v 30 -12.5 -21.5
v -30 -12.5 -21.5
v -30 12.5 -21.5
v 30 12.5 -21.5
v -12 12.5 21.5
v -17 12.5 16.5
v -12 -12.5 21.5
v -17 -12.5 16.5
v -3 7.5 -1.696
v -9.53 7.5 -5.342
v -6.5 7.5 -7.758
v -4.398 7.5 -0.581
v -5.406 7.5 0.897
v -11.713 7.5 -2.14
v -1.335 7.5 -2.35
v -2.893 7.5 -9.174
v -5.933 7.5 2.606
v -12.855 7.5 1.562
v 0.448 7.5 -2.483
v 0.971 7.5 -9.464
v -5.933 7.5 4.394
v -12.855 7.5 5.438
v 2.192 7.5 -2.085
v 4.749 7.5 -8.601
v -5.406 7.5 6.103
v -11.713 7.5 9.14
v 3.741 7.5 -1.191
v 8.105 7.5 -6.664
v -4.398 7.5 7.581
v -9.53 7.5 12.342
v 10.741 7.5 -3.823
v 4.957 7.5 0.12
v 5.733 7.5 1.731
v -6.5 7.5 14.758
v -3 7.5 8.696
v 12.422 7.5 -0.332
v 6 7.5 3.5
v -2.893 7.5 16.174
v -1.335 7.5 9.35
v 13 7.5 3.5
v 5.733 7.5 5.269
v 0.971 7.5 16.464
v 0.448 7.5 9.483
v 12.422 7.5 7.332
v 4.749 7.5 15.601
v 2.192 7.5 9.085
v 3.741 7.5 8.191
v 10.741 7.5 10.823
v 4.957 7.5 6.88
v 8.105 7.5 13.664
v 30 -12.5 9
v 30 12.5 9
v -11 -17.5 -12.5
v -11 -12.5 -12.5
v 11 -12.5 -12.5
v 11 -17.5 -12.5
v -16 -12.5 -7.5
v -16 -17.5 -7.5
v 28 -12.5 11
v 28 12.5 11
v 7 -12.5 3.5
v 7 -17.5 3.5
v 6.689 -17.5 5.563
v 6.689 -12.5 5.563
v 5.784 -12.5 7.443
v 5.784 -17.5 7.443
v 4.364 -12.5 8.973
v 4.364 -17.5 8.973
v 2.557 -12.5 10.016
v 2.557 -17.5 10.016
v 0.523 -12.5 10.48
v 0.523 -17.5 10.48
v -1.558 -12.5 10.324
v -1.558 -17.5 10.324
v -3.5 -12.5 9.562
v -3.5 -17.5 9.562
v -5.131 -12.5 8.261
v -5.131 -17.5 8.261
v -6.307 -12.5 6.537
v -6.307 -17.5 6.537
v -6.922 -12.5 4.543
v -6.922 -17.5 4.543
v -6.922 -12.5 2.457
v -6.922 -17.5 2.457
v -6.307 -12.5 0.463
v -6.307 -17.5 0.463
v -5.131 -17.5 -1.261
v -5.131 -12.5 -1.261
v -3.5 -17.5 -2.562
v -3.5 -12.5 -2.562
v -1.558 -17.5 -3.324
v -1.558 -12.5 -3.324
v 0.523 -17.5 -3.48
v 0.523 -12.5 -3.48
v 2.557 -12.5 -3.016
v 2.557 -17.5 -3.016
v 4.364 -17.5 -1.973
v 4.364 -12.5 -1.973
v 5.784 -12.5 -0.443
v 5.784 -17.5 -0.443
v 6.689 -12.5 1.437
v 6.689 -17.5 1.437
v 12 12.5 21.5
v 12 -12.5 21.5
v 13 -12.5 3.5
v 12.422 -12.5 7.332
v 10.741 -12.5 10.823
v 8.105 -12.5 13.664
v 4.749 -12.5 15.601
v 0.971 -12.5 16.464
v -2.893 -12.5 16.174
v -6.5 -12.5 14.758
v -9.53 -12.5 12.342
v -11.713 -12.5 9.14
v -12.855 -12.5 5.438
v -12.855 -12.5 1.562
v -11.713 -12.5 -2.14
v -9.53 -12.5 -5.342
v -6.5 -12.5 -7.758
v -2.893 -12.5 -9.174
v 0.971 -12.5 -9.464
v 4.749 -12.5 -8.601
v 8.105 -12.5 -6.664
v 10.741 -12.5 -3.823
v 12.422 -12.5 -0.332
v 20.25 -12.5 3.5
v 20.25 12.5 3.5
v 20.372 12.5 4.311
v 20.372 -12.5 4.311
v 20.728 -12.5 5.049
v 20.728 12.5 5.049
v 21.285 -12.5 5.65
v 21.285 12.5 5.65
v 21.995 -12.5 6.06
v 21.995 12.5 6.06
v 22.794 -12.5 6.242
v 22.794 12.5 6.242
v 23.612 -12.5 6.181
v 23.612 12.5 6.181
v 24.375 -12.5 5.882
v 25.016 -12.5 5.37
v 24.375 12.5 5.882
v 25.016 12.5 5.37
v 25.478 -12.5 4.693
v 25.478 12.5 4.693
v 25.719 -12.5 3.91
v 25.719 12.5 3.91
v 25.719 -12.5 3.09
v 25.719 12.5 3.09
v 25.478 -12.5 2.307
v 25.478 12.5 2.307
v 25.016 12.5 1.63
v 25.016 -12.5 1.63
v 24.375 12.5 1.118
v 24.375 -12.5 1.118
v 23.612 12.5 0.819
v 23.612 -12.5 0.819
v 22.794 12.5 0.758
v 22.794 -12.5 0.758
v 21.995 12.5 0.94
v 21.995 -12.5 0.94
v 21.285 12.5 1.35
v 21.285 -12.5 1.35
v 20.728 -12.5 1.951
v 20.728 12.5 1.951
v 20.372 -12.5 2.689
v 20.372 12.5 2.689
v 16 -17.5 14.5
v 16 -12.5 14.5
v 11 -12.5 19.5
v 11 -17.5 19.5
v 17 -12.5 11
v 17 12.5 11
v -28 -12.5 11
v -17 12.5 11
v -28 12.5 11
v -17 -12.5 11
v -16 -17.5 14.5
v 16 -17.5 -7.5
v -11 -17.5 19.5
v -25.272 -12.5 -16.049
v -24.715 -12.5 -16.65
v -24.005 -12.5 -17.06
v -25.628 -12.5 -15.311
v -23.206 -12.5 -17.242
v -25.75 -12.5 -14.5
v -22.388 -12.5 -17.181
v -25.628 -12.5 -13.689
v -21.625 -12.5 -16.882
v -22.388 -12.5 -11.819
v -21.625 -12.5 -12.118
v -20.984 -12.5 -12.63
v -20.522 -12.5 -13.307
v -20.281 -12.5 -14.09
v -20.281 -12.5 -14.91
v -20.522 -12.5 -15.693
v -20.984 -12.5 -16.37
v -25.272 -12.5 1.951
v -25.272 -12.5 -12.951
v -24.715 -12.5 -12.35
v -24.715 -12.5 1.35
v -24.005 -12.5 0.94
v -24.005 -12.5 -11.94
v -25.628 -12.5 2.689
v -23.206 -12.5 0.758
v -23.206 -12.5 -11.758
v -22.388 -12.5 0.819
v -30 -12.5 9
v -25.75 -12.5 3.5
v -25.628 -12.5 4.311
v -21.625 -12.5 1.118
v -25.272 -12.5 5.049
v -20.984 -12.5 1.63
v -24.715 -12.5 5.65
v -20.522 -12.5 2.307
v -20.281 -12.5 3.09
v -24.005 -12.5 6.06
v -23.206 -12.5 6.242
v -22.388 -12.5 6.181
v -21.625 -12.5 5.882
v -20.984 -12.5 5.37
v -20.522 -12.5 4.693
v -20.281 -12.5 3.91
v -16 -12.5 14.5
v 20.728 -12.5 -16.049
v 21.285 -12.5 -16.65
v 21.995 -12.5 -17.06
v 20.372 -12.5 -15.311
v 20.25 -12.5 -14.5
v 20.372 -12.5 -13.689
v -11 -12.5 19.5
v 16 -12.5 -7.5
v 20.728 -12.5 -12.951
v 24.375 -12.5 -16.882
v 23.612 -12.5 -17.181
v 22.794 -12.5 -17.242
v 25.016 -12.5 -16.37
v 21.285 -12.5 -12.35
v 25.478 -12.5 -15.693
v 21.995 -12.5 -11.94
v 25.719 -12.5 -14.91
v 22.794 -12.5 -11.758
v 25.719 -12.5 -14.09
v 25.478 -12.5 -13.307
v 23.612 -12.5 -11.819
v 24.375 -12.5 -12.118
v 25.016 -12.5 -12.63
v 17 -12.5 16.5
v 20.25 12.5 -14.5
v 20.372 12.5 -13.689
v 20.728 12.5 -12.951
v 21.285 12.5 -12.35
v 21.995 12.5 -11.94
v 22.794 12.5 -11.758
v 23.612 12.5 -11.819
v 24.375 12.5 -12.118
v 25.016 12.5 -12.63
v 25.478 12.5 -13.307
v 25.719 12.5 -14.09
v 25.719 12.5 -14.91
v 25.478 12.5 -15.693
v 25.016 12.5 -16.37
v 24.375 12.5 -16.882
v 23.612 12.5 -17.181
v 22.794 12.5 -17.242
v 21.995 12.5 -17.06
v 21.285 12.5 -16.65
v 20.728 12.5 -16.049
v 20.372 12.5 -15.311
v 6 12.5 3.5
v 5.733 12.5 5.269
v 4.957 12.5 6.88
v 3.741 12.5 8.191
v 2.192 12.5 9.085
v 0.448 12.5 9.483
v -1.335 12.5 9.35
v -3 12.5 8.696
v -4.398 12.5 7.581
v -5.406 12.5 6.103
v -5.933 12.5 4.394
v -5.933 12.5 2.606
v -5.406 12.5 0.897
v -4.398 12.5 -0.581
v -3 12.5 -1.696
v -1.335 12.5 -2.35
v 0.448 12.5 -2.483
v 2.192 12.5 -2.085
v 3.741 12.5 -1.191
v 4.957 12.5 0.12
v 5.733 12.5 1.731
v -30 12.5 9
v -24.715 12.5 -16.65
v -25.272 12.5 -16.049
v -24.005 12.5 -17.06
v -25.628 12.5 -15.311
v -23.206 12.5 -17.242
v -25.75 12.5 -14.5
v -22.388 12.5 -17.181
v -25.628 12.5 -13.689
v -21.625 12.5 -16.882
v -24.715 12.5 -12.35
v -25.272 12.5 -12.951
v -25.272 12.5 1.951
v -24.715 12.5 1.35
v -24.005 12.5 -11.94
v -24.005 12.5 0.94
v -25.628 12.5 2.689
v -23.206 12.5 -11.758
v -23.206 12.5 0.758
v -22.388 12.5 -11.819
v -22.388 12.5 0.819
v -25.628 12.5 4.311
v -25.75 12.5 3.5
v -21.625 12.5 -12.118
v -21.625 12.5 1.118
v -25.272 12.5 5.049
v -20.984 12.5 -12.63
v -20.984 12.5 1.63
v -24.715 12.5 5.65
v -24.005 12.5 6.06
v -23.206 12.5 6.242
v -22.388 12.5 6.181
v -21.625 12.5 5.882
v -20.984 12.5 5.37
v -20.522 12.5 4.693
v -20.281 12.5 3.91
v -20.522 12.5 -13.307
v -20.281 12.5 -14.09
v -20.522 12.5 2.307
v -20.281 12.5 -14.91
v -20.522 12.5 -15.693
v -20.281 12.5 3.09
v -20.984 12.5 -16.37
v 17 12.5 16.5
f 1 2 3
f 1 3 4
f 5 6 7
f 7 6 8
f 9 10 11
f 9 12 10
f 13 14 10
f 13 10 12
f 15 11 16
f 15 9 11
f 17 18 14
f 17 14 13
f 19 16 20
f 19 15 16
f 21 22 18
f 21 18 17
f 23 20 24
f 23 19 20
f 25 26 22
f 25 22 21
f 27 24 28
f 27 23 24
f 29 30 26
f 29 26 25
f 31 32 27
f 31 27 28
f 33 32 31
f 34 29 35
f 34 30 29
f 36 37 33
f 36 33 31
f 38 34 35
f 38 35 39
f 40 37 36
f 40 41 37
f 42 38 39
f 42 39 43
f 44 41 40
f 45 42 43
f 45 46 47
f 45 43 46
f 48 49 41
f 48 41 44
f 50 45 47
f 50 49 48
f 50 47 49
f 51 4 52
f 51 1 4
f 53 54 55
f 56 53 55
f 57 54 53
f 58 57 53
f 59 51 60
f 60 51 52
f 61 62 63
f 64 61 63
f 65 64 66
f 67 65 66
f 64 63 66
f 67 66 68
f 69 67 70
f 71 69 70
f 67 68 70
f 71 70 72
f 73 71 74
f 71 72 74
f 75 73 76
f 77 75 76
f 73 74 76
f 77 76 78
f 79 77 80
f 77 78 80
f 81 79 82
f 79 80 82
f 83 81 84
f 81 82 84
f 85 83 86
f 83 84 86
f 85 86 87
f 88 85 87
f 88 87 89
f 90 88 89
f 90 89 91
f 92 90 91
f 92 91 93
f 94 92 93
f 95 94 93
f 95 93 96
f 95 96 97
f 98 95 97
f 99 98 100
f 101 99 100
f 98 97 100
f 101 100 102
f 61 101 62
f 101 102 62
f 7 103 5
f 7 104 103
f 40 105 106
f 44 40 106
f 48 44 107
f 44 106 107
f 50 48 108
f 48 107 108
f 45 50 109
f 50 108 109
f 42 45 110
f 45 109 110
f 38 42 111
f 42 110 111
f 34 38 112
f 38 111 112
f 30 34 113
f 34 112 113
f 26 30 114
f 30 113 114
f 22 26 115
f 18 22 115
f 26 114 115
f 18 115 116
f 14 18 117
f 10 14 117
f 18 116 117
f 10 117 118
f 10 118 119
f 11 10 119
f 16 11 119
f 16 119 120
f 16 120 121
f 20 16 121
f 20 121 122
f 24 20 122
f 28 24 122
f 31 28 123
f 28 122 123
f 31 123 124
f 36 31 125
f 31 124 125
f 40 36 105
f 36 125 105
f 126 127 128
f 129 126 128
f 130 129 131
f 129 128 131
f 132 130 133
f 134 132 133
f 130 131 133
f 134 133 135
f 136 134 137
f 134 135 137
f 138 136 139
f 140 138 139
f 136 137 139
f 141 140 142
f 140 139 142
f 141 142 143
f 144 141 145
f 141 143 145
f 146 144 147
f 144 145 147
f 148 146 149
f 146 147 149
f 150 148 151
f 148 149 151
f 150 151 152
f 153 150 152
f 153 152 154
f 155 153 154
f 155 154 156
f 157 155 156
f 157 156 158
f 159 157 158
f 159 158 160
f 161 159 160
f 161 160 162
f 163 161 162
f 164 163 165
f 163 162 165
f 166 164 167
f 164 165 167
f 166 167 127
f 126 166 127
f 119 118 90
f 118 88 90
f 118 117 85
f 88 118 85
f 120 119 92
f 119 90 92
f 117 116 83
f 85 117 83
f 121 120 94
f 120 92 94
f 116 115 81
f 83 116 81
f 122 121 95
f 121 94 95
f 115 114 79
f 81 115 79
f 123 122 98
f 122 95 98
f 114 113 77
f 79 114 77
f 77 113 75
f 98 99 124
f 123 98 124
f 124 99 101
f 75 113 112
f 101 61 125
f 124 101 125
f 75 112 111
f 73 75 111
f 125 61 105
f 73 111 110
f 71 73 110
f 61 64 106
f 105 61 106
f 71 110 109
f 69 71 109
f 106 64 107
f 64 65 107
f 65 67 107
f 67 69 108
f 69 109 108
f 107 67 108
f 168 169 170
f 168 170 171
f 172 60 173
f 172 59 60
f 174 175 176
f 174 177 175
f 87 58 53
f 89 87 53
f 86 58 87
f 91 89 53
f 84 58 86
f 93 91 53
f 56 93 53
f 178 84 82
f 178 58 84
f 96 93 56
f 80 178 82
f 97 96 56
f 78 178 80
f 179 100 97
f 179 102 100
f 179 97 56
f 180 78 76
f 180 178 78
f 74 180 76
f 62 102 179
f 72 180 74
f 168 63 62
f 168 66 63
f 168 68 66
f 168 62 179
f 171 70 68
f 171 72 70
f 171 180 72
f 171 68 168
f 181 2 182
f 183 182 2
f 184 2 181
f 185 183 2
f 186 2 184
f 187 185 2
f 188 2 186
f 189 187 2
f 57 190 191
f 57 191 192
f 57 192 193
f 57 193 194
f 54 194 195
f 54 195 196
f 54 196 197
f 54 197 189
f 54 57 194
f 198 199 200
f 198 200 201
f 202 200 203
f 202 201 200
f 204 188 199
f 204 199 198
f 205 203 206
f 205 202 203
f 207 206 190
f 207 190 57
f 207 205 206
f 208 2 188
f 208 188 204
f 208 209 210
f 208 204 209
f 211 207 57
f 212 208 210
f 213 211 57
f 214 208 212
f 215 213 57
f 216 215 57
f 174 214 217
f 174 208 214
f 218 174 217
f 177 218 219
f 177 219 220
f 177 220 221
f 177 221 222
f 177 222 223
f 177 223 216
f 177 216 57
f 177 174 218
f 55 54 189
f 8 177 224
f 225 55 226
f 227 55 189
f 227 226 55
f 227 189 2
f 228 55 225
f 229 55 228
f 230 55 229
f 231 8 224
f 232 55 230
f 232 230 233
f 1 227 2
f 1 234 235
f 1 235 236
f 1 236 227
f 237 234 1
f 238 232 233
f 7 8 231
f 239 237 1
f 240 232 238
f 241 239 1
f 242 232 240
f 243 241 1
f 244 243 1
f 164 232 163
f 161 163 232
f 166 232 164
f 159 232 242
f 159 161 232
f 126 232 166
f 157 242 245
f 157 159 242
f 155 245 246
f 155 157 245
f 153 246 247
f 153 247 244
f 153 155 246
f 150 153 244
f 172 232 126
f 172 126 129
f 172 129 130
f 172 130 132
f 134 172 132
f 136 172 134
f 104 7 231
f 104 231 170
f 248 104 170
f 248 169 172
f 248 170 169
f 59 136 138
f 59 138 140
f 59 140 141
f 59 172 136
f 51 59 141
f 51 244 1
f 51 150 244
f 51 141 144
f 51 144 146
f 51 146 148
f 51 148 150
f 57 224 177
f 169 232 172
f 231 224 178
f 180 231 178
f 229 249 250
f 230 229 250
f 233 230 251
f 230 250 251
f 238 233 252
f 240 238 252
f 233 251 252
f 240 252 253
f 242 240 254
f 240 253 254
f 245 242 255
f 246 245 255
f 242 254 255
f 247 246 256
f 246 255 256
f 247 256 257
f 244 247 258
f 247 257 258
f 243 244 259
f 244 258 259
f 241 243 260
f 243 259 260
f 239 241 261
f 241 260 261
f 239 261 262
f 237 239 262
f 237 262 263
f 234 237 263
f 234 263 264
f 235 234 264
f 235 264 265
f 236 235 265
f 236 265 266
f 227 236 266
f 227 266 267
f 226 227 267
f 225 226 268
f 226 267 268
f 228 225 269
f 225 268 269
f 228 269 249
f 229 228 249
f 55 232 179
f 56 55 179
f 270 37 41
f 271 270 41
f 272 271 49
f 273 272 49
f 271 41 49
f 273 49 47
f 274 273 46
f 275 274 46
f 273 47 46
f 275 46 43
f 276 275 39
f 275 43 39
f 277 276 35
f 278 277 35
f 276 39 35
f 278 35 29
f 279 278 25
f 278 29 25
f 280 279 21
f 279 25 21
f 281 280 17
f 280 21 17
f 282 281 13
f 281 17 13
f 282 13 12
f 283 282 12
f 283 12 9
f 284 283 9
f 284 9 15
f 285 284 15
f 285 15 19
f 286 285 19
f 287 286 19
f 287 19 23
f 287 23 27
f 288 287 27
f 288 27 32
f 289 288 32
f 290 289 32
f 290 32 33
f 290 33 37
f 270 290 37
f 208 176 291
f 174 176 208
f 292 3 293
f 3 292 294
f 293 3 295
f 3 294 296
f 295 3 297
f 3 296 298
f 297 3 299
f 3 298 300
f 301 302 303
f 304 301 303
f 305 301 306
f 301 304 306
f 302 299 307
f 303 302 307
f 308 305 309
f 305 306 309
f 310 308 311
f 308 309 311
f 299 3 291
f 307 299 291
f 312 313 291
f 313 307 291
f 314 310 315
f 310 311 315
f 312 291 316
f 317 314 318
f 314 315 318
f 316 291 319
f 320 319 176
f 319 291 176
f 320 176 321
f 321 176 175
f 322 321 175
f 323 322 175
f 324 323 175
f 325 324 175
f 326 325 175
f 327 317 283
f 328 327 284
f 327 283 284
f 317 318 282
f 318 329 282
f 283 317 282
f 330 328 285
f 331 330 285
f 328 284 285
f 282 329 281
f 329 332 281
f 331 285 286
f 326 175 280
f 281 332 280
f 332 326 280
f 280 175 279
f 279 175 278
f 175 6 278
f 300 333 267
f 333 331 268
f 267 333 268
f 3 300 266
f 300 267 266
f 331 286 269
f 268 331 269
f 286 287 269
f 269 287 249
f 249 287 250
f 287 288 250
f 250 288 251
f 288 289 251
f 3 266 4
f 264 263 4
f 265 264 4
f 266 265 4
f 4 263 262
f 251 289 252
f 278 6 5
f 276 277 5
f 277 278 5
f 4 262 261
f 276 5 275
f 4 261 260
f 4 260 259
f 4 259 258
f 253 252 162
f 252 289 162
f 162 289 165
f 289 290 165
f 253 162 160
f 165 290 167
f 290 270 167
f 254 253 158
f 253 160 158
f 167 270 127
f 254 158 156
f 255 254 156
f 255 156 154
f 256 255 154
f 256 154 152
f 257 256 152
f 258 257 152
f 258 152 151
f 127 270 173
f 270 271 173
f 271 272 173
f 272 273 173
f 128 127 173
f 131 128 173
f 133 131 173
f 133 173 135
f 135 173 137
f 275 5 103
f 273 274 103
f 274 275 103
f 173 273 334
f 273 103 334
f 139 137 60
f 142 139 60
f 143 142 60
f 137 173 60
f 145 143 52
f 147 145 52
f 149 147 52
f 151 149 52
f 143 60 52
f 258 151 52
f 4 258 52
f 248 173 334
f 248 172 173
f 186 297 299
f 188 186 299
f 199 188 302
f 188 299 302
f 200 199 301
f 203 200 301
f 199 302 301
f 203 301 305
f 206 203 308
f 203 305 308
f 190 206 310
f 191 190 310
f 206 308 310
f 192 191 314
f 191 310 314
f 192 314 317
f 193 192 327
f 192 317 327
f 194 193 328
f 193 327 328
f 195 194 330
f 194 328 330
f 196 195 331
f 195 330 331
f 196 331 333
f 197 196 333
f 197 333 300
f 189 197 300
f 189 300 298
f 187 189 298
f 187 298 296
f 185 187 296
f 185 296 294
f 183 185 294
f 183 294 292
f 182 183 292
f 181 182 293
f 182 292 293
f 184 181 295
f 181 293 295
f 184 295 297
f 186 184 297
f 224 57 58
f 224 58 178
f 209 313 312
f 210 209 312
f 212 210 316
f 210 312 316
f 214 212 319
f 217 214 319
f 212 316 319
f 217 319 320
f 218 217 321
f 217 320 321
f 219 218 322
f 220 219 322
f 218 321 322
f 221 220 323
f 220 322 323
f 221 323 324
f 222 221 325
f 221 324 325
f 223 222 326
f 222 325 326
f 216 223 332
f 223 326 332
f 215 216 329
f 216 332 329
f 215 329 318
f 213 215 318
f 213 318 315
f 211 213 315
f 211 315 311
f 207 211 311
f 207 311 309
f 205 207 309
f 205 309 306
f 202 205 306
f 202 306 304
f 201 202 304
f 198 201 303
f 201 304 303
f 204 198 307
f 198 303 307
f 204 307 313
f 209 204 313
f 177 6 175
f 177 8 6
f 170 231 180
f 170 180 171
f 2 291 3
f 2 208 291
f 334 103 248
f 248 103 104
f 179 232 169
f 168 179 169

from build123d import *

# Parameters (mm, degrees)
F1_DEPTH  = 12.5
F2_R      = 6
F3_DEPTH  = 25
F4_R      = 13
F5_DEPTH  = 20
F6_W      = 32
F6_H      = 32
F7_DEPTH  = 5
F8_R      = 7
F9_DEPTH  = 5
F10_SIZE  = 5
F11_SIZE  = 5
F12_R     = 2.75
F13_DEPTH = 25
F14_SIZE  = 2


with BuildPart() as f1:
    # F0 (on Front) → F1 (new body, symmetric)
    with BuildSketch(Plane.XZ):
        Polygon((17, 11), (17, 21.5), (-17, 21.5), (-17, 11), (-30, 11), (-30, -21.5), (30, -21.5), (30, 11), align=None)
    extrude(amount=F1_DEPTH, both=True)

    # F2 (on face) → F3 (cut)
    with BuildSketch(Plane.XZ.offset(12.5)):
        with Locations((0, 3.5)):
            Circle(F2_R)
    extrude(amount=-F3_DEPTH, mode=Mode.SUBTRACT)

    # F4 (on face) → F5 (cut)
    with BuildSketch(Plane.XZ.offset(12.5)):
        with Locations((0, 3.5)):
            Circle(F4_R)
    extrude(amount=-F5_DEPTH, mode=Mode.SUBTRACT)

    # F6 (on face) → F7 (join)
    with BuildSketch(Plane.XZ.offset(12.5)):
        with Locations((0, 3.5)):
            Rectangle(F6_W, F6_H)
    extrude(amount=F7_DEPTH)

    # F8 (on face) → F9 (cut)
    with BuildSketch(Plane.XZ.offset(17.5)):
        with Locations((0, 3.5)):
            Circle(F8_R)
    extrude(amount=-F9_DEPTH, mode=Mode.SUBTRACT)

    # F10
    f10_edges = [f1.edges().sort_by_distance(p)[0] for p in [
        (-16, -15, 19.5),
        (-16, -15, -12.5),
        (16, -15, 19.5),
        (16, -15, -12.5),
    ]]
    chamfer(f10_edges, length=F10_SIZE)

    # F11
    f11_edges = [f1.edges().sort_by_distance(p)[0] for p in [
        (17, 0, 21.5),
        (-17, 0, 21.5),
    ]]
    chamfer(f11_edges, length=F11_SIZE)

    # F12 (on face) → F13 (cut)
    with BuildSketch(Plane(origin=(0, 12.5, 0), x_dir=(-1, 0, 0), z_dir=(0, 1, 0))):
        with Locations((-23, 3.5)):
            Circle(F12_R)
        with Locations((23, 3.5)):
            Circle(F12_R)
        with Locations((23, -14.5)):
            Circle(F12_R)
        with Locations((-23, -14.5)):
            Circle(F12_R)
    extrude(amount=-F13_DEPTH, mode=Mode.SUBTRACT)

    # F14
    f14_edges = [f1.edges().sort_by_distance(p)[0] for p in [
        (30, 0, 11),
        (-30, 0, 11),
    ]]
    chamfer(f14_edges, length=F14_SIZE)


solid = f1.part
